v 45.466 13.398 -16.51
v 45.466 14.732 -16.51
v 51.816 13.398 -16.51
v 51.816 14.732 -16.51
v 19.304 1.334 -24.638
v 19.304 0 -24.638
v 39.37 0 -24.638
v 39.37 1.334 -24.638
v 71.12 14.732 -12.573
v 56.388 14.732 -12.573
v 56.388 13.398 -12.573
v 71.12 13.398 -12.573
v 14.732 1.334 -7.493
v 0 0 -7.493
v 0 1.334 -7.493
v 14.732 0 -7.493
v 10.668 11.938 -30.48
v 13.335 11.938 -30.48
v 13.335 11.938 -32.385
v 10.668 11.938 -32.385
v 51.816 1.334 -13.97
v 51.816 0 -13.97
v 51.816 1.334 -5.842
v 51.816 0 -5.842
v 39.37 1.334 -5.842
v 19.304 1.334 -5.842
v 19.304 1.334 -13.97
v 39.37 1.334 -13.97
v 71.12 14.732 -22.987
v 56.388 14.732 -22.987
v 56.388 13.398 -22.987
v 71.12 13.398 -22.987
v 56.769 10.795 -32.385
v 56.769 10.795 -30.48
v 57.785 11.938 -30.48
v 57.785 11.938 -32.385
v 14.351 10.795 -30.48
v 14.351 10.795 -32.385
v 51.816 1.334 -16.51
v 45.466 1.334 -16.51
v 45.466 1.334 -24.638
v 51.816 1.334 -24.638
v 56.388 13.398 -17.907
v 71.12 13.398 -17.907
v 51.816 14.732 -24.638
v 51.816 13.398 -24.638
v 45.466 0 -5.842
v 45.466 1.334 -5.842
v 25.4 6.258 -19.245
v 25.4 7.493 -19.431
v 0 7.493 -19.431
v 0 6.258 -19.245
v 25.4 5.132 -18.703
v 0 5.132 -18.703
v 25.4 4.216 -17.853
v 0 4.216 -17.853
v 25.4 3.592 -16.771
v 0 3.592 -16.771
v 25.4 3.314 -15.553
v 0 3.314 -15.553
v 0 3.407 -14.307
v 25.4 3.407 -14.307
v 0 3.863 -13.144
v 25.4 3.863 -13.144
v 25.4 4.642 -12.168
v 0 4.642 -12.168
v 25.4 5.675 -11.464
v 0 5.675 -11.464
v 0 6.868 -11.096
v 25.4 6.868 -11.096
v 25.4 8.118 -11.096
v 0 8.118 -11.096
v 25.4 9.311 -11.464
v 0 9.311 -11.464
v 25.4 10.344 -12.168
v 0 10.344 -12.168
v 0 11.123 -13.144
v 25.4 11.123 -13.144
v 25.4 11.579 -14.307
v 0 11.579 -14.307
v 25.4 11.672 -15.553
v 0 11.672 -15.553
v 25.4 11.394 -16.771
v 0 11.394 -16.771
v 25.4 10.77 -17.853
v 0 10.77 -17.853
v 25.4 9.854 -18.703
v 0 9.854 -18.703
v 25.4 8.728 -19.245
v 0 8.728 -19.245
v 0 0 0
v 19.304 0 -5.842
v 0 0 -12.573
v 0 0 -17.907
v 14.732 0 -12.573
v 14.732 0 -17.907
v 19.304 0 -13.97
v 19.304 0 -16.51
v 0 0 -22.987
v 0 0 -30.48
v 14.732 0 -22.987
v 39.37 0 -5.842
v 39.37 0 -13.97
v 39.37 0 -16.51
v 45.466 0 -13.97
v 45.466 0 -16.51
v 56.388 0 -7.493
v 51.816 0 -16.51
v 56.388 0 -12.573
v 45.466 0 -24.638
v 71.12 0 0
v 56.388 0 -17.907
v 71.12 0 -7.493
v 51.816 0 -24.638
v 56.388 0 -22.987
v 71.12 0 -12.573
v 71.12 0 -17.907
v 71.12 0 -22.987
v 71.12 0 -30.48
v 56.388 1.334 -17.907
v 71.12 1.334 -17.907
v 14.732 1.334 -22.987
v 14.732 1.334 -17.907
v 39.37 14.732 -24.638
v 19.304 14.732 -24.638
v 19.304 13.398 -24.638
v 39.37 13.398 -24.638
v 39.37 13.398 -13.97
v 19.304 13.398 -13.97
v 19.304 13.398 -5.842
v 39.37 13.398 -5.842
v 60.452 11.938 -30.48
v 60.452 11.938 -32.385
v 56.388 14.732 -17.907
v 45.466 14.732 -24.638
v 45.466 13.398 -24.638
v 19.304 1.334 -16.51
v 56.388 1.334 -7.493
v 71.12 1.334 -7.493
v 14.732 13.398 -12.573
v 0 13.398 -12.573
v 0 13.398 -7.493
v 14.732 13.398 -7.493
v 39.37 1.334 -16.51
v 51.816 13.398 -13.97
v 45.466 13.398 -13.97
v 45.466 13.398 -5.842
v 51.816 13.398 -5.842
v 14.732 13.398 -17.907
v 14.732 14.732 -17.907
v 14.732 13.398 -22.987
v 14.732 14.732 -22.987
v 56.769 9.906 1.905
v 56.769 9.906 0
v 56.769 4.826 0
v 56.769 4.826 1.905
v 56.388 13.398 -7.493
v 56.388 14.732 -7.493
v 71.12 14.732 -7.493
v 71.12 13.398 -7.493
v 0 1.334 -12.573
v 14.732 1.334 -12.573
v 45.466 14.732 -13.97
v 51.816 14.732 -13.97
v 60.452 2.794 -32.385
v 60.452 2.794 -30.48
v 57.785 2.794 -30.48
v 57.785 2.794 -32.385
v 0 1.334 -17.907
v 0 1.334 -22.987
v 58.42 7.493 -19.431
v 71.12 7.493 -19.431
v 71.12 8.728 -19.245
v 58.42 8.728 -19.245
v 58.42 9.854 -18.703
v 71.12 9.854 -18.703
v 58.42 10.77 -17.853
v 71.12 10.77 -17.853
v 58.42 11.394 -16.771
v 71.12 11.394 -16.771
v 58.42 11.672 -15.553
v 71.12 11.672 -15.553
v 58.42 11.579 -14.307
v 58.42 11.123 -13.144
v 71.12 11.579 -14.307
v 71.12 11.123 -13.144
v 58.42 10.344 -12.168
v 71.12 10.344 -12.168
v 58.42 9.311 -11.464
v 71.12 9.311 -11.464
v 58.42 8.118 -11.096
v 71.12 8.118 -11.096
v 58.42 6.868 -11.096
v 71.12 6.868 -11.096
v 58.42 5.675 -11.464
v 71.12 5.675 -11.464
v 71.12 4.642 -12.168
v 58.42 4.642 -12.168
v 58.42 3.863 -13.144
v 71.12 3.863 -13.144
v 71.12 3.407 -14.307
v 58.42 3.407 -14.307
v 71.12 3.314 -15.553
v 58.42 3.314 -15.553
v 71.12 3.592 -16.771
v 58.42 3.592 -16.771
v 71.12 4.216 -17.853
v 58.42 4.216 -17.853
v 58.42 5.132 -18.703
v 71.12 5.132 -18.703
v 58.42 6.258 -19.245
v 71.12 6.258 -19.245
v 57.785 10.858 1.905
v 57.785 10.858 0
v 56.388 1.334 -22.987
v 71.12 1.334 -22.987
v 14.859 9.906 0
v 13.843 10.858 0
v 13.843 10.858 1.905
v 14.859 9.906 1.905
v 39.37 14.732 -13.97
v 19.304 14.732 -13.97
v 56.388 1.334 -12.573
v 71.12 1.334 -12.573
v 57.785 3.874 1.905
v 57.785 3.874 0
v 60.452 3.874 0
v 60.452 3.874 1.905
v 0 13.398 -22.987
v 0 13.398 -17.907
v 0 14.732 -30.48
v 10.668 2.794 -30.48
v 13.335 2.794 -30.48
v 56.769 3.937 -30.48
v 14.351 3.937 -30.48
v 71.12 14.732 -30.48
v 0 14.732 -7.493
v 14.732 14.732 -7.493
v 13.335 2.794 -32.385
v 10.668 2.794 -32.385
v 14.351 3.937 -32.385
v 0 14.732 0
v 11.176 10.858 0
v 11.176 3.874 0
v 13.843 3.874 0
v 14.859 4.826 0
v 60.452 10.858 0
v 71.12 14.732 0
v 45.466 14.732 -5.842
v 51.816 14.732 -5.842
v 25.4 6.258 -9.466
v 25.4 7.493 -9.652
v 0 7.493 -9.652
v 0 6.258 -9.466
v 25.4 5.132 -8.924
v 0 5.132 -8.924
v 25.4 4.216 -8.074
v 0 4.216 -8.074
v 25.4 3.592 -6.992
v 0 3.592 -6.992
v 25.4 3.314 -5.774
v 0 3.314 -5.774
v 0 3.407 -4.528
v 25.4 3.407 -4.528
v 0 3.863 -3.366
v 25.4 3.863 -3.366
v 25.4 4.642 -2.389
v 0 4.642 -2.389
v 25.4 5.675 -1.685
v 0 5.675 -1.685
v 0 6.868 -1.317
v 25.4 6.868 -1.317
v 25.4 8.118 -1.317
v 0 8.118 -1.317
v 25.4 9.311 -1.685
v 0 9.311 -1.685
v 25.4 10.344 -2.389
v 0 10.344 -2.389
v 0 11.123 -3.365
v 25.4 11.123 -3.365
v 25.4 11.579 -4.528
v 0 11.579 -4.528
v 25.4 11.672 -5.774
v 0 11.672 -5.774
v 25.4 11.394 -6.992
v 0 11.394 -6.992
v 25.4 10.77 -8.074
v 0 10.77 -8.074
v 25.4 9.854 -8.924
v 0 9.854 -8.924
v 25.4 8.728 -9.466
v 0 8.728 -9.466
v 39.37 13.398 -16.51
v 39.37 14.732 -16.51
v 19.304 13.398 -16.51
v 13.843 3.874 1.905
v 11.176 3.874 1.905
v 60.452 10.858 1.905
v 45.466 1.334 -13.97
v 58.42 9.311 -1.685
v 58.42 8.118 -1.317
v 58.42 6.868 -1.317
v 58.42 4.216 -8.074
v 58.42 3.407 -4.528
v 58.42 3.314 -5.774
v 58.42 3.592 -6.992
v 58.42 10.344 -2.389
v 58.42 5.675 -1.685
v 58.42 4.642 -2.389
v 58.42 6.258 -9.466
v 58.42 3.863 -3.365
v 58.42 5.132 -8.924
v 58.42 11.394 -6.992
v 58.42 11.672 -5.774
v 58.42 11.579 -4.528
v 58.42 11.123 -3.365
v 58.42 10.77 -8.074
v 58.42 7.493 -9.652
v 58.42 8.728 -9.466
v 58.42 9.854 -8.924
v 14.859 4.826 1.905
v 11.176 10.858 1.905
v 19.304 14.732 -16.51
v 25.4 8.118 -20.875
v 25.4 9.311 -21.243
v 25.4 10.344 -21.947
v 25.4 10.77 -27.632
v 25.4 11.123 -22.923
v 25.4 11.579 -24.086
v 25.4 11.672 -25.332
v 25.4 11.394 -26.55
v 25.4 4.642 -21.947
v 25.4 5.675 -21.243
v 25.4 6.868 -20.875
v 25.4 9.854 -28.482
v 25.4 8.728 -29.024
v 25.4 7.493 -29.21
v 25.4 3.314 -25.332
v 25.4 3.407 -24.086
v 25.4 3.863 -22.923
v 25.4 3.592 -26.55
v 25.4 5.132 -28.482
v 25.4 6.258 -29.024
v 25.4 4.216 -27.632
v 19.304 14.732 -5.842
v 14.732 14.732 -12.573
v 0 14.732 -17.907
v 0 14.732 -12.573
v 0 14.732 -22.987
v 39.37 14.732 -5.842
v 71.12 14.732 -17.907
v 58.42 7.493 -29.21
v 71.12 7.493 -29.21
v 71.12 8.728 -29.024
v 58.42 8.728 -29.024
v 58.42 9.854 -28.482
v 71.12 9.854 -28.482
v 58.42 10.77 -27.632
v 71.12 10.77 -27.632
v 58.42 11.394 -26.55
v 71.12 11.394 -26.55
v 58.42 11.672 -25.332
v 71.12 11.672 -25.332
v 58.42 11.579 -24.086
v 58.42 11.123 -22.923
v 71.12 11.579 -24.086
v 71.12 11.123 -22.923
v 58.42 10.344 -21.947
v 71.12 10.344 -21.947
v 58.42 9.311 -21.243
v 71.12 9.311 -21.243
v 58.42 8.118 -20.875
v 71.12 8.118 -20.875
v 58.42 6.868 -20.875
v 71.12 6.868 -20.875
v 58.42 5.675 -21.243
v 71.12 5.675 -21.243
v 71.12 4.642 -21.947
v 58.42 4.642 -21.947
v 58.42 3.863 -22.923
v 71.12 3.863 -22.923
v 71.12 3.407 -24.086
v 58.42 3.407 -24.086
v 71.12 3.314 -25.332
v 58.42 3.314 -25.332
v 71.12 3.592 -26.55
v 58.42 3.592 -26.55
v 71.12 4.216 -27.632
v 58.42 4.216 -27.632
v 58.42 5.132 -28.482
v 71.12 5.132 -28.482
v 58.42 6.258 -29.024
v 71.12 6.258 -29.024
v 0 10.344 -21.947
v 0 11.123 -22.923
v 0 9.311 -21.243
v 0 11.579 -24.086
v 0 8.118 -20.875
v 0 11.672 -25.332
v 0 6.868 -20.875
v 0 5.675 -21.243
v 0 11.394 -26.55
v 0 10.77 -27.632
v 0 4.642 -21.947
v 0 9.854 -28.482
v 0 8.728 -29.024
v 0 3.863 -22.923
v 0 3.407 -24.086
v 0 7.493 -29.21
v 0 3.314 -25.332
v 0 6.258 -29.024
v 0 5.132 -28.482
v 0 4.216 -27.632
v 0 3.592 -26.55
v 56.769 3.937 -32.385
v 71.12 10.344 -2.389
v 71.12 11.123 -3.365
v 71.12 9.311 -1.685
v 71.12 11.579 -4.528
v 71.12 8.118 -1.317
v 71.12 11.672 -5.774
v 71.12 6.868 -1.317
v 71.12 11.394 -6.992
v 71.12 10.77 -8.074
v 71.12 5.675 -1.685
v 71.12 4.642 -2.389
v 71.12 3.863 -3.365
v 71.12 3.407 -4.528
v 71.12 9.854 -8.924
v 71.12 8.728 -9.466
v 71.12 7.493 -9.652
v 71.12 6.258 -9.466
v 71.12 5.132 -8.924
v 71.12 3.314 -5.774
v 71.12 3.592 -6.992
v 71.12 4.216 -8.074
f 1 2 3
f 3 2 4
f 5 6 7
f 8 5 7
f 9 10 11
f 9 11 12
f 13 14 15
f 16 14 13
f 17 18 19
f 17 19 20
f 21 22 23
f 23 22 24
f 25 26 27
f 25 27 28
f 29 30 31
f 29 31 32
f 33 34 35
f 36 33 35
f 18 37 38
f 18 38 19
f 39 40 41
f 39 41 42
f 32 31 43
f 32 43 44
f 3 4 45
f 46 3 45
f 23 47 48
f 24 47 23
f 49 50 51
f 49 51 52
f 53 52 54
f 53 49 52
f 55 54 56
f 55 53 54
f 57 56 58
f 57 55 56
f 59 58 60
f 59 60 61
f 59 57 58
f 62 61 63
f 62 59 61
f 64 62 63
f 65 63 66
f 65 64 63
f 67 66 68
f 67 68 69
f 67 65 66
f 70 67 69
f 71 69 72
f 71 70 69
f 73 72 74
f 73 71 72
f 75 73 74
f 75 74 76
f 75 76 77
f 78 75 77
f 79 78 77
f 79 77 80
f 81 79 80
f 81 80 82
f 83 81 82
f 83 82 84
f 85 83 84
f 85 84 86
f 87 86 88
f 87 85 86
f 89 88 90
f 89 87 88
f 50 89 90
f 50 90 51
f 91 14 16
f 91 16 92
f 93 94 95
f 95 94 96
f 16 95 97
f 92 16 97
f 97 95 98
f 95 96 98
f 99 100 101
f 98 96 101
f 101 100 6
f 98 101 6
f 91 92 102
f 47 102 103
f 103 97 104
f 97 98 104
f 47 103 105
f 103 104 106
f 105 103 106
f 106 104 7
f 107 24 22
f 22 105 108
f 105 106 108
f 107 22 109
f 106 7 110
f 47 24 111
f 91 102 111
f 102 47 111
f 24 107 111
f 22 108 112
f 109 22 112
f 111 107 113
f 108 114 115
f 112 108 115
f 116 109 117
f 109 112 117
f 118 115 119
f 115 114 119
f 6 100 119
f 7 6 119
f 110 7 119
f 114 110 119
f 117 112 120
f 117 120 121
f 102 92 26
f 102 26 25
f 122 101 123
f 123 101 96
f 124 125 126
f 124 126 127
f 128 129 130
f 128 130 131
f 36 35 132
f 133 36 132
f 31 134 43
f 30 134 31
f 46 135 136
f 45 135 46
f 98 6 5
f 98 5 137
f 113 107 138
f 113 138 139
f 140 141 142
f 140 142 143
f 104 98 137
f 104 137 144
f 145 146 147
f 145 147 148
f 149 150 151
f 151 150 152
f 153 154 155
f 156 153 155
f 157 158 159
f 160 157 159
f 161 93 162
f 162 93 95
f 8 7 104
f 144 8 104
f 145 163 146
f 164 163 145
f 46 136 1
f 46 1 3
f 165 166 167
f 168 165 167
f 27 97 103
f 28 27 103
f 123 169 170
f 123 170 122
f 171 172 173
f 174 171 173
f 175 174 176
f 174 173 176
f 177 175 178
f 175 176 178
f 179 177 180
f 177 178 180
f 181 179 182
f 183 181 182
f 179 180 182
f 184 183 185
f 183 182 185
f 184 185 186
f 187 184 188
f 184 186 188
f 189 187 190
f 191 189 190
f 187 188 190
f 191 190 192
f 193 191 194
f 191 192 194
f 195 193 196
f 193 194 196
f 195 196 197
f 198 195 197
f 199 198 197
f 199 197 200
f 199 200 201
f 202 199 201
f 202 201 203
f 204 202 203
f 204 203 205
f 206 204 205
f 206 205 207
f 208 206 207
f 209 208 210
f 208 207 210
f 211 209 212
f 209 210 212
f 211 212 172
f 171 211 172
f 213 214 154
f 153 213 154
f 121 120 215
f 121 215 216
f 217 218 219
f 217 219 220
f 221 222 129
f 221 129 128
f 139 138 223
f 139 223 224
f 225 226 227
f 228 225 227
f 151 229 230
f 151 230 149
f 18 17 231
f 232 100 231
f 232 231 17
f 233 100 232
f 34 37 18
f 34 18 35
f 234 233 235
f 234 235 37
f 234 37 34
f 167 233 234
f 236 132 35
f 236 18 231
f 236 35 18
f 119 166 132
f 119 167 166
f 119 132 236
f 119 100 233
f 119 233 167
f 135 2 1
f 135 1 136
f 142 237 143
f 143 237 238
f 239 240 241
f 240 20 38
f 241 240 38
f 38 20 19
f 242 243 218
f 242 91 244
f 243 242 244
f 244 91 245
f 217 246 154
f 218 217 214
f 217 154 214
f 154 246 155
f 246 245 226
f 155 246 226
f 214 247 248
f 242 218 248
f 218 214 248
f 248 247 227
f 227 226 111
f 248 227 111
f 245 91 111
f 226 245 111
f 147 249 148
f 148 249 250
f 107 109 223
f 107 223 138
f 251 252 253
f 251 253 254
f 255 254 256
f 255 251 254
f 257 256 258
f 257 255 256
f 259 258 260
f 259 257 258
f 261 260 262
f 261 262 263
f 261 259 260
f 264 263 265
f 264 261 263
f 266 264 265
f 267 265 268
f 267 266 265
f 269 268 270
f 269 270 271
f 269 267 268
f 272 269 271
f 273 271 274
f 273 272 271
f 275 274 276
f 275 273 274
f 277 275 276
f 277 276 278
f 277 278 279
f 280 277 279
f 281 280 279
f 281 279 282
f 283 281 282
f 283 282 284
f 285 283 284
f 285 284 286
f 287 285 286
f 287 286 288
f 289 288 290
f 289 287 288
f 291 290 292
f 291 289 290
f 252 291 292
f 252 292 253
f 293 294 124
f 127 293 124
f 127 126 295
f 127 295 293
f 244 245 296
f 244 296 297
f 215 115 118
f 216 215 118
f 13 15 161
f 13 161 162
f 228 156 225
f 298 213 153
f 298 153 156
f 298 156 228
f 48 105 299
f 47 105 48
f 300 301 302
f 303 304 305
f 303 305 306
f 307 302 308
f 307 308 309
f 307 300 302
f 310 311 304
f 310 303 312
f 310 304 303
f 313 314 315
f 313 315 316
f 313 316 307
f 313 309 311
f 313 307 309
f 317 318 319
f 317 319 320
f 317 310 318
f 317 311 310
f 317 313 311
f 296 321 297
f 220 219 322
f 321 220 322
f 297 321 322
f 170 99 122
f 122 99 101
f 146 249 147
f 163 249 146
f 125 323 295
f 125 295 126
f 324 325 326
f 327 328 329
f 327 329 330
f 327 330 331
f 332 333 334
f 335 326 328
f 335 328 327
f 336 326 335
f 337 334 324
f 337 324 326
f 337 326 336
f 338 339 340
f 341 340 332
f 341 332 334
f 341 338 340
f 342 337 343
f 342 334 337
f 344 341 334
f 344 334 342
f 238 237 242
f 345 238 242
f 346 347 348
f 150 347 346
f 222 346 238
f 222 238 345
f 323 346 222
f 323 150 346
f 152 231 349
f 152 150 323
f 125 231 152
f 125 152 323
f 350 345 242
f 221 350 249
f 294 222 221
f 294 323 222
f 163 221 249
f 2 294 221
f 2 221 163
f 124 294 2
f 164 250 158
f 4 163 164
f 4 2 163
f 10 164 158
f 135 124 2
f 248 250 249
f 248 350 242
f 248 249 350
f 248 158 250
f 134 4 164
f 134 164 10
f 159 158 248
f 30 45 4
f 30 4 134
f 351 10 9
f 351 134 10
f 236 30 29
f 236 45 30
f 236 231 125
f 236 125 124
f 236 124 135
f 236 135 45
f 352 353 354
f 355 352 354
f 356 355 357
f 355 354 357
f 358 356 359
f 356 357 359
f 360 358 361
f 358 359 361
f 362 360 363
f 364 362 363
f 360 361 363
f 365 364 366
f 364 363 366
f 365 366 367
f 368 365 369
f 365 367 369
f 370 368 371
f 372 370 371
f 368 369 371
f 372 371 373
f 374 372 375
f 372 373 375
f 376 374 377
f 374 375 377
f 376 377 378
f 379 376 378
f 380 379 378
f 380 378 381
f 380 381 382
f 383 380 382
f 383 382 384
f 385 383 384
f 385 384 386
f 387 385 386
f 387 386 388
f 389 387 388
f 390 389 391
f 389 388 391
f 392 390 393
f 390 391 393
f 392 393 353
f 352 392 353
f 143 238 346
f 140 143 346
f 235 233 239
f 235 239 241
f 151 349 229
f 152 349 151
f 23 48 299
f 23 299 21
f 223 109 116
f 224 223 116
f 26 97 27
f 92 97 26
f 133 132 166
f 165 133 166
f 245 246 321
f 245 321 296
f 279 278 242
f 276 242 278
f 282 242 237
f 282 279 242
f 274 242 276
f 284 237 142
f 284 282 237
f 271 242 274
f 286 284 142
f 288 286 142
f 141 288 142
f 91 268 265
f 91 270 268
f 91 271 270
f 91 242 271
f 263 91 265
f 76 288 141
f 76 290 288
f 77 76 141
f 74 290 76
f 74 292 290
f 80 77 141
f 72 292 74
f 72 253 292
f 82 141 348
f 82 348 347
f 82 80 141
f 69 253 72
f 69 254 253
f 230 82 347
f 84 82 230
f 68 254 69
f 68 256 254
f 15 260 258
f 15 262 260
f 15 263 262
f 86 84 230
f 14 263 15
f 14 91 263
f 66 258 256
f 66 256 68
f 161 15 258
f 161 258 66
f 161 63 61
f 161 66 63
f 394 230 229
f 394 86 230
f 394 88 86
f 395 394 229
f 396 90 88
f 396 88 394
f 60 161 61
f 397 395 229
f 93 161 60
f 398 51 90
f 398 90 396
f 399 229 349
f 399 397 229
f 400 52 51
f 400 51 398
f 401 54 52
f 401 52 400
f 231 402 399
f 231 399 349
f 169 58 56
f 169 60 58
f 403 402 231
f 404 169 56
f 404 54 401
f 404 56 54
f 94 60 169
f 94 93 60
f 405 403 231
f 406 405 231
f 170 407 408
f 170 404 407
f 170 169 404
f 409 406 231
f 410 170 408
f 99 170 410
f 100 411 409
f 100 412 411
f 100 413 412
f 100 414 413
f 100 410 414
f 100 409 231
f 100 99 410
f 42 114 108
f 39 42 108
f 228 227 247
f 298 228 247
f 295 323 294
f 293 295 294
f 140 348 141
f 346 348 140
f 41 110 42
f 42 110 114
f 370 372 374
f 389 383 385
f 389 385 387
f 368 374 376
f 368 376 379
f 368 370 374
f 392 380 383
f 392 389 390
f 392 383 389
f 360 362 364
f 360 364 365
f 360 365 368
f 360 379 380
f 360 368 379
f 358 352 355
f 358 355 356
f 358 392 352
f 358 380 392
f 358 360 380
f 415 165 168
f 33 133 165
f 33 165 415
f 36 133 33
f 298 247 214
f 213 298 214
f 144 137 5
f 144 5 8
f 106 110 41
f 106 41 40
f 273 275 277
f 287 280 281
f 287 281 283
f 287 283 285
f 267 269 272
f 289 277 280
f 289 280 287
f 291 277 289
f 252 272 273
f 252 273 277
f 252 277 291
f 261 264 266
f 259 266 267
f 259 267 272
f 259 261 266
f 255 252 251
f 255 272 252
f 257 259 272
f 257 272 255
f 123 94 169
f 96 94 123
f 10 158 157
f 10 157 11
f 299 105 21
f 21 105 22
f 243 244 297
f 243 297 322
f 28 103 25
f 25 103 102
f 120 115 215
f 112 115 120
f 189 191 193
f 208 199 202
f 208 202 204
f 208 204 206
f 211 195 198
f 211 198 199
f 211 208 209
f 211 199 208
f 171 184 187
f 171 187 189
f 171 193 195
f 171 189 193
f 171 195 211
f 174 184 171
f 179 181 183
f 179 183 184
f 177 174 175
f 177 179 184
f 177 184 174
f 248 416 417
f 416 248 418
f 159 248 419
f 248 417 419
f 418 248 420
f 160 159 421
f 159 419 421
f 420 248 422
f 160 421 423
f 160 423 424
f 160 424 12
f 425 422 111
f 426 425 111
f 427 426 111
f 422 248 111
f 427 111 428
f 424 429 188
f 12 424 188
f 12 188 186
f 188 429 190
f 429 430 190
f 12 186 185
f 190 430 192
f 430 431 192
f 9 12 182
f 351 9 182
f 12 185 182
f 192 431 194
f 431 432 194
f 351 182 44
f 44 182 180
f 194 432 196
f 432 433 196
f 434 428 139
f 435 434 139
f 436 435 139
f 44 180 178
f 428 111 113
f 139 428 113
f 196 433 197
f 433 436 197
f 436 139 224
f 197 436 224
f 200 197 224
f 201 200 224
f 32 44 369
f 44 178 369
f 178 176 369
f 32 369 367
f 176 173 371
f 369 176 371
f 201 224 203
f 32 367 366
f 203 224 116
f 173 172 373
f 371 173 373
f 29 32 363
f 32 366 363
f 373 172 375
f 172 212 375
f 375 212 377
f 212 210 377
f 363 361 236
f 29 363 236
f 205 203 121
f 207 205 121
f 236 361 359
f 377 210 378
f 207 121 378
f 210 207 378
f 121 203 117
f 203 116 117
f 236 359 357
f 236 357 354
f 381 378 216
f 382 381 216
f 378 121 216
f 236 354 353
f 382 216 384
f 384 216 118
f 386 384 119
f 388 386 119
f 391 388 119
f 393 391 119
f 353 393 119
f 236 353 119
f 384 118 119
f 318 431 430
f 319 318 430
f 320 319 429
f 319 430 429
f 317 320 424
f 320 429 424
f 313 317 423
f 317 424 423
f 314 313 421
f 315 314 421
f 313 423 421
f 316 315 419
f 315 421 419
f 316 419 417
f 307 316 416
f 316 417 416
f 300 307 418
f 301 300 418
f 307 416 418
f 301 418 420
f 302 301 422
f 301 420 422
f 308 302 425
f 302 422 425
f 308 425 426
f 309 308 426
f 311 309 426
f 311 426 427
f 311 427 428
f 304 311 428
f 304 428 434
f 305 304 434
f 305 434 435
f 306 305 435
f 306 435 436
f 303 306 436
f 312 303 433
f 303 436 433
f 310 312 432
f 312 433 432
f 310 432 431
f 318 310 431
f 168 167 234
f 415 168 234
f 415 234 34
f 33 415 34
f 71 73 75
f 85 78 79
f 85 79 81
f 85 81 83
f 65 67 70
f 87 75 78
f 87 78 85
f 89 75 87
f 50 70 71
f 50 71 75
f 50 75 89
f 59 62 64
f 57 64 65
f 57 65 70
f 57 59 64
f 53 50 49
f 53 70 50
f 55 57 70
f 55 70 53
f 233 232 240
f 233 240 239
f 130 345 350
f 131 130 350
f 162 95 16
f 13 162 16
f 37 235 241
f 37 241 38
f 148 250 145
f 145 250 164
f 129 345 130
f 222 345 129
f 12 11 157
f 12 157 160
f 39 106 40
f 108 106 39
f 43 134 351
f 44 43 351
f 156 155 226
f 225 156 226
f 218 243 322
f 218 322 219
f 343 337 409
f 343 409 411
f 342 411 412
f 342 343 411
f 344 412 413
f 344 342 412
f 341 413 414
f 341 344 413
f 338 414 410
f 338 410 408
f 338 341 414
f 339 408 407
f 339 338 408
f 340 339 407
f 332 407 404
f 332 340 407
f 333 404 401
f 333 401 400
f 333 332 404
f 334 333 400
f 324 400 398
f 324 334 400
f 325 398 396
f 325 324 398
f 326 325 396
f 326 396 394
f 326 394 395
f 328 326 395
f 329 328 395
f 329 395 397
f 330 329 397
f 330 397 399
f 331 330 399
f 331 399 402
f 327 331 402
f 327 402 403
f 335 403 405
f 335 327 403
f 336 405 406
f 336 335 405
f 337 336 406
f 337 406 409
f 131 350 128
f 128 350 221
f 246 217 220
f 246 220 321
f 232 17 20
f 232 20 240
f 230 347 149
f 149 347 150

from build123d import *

# Parameters (mm, degrees)
SKETCH1_W           = 71.12
SKETCH1_H           = 30.48
BOSS_EXTRUDE1_DEPTH = 14.732
SKETCH2_R           = 4.191
CUT_EXTRUDE1_DEPTH  = 12.7
CUT_EXTRUDE2_START  = -25.4
SKETCH3_R           = 4.191
CUT_EXTRUDE2_DEPTH  = 25.4
SKETCH4_W           = 14.732
SKETCH4_H           = 5.08
SKETCH4_W_2         = 6.35
SKETCH4_H_2         = 8.128
SKETCH4_W_3         = 20.066
CUT_EXTRUDE3_DEPTH  = 1.3335
BOSS_EXTRUDE2_DEPTH = 1.905
BOSS_EXTRUDE3_DEPTH = 1.905
SKETCH7_W           = 14.732
SKETCH7_H           = 5.08
SKETCH7_W_2         = 20.066
SKETCH7_H_2         = 8.128
SKETCH7_W_3         = 6.35
CUT_EXTRUDE4_DEPTH  = 1.3335


with BuildPart() as part:
    # Sketch1 → Boss-Extrude1 (new body)
    with BuildSketch(Plane(origin=(0, 0, 0), x_dir=(1, 0, 0), z_dir=(0, 1, 0))):
        with Locations((35.56, 15.24)):
            Rectangle(SKETCH1_W, SKETCH1_H)
    extrude(amount=BOSS_EXTRUDE1_DEPTH)

    # Sketch2 → Cut-Extrude1 (cut)
    with BuildSketch(Plane(origin=(71.12, 0, 0), x_dir=(0, 0, -1), z_dir=(1, 0, 0))):
        with Locations((15.24, 7.493)):
            Circle(SKETCH2_R)
        with Locations((25.019, 7.493)):
            Circle(SKETCH2_R)
        with Locations((5.461, 7.493)):
            Circle(SKETCH2_R)
    extrude(amount=-CUT_EXTRUDE1_DEPTH, mode=Mode.SUBTRACT)

    # Sketch3 → Cut-Extrude2 (cut)
    with BuildSketch(Plane.ZY.offset(CUT_EXTRUDE2_START)):
        with Locations(Location((-15.24, 7.493, 0), (0, 0, 180))):
            Circle(SKETCH3_R)
        with Locations(Location((-5.461, 7.493, 0), (0, 0, 180))):
            Circle(SKETCH3_R)
        with Locations(Location((-25.019, 7.493, 0), (0, 0, 180))):
            Circle(SKETCH3_R)
    extrude(amount=CUT_EXTRUDE2_DEPTH, mode=Mode.SUBTRACT)

    # Sketch4 → Cut-Extrude3 (cut)
    with BuildSketch(Plane(origin=(0, 14.732, 0), x_dir=(1, 0, 0), z_dir=(0, 1, 0))):
        with Locations((63.754, 20.447)):
            Rectangle(SKETCH4_W, SKETCH4_H)
        with Locations((63.754, 10.033)):
            Rectangle(SKETCH4_W, SKETCH4_H)
        with Locations((48.641, 20.574)):
            Rectangle(SKETCH4_W_2, SKETCH4_H_2)
        with Locations((48.641, 9.906)):
            Rectangle(SKETCH4_W_2, SKETCH4_H_2)
        with Locations((29.337, 20.574)):
            Rectangle(SKETCH4_W_3, SKETCH4_H_2)
        with Locations((29.337, 9.906)):
            Rectangle(SKETCH4_W_3, SKETCH4_H_2)
        with Locations((7.366, 20.447)):
            Rectangle(SKETCH4_W, SKETCH4_H)
        with Locations((7.366, 10.033)):
            Rectangle(SKETCH4_W, SKETCH4_H)
    extrude(amount=-CUT_EXTRUDE3_DEPTH, mode=Mode.SUBTRACT)

    # Sketch5 → Boss-Extrude2 (add)
    with BuildSketch(Plane.XY):
        Polygon((60.452, 3.8735), (60.452, 10.8585), (57.785, 10.8585), (56.769, 9.906), (56.769, 4.826), (57.785, 3.8735), align=None)
        Polygon((13.843, 3.8735), (11.176, 3.8735), (11.176, 10.8585), (13.843, 10.8585), (14.859, 9.906), (14.859, 4.826), align=None)
    extrude(amount=BOSS_EXTRUDE2_DEPTH)

    # Sketch6 → Boss-Extrude3 (add)
    with BuildSketch(Plane(origin=(0, 0, -30.48), x_dir=(-1, 0, 0), z_dir=(0, 0, -1))):
        Polygon((-60.452, 11.938), (-60.452, 2.794), (-57.785, 2.794), (-56.769, 3.937), (-56.769, 10.795), (-57.785, 11.938), align=None)
        Polygon((-13.335, 11.938), (-10.668, 11.938), (-10.668, 2.794), (-13.335, 2.794), (-14.351, 3.937), (-14.351, 10.795), align=None)
    extrude(amount=BOSS_EXTRUDE3_DEPTH)

    # Sketch7 → Cut-Extrude4 (cut)
    with BuildSketch(Plane.XZ):
        with Locations((7.366, -20.447)):
            Rectangle(SKETCH7_W, SKETCH7_H)
        with Locations((7.366, -10.033)):
            Rectangle(SKETCH7_W, SKETCH7_H)
        with Locations((29.337, -20.574)):
            Rectangle(SKETCH7_W_2, SKETCH7_H_2)
        with Locations((29.337, -9.906)):
            Rectangle(SKETCH7_W_2, SKETCH7_H_2)
        with Locations((48.641, -20.574)):
            Rectangle(SKETCH7_W_3, SKETCH7_H_2)
        with Locations((48.641, -9.906)):
            Rectangle(SKETCH7_W_3, SKETCH7_H_2)
        with Locations((63.754, -20.447)):
            Rectangle(SKETCH7_W, SKETCH7_H)
        with Locations((63.754, -10.033)):
            Rectangle(SKETCH7_W, SKETCH7_H)
    extrude(amount=-CUT_EXTRUDE4_DEPTH, mode=Mode.SUBTRACT)


solid = part.part
